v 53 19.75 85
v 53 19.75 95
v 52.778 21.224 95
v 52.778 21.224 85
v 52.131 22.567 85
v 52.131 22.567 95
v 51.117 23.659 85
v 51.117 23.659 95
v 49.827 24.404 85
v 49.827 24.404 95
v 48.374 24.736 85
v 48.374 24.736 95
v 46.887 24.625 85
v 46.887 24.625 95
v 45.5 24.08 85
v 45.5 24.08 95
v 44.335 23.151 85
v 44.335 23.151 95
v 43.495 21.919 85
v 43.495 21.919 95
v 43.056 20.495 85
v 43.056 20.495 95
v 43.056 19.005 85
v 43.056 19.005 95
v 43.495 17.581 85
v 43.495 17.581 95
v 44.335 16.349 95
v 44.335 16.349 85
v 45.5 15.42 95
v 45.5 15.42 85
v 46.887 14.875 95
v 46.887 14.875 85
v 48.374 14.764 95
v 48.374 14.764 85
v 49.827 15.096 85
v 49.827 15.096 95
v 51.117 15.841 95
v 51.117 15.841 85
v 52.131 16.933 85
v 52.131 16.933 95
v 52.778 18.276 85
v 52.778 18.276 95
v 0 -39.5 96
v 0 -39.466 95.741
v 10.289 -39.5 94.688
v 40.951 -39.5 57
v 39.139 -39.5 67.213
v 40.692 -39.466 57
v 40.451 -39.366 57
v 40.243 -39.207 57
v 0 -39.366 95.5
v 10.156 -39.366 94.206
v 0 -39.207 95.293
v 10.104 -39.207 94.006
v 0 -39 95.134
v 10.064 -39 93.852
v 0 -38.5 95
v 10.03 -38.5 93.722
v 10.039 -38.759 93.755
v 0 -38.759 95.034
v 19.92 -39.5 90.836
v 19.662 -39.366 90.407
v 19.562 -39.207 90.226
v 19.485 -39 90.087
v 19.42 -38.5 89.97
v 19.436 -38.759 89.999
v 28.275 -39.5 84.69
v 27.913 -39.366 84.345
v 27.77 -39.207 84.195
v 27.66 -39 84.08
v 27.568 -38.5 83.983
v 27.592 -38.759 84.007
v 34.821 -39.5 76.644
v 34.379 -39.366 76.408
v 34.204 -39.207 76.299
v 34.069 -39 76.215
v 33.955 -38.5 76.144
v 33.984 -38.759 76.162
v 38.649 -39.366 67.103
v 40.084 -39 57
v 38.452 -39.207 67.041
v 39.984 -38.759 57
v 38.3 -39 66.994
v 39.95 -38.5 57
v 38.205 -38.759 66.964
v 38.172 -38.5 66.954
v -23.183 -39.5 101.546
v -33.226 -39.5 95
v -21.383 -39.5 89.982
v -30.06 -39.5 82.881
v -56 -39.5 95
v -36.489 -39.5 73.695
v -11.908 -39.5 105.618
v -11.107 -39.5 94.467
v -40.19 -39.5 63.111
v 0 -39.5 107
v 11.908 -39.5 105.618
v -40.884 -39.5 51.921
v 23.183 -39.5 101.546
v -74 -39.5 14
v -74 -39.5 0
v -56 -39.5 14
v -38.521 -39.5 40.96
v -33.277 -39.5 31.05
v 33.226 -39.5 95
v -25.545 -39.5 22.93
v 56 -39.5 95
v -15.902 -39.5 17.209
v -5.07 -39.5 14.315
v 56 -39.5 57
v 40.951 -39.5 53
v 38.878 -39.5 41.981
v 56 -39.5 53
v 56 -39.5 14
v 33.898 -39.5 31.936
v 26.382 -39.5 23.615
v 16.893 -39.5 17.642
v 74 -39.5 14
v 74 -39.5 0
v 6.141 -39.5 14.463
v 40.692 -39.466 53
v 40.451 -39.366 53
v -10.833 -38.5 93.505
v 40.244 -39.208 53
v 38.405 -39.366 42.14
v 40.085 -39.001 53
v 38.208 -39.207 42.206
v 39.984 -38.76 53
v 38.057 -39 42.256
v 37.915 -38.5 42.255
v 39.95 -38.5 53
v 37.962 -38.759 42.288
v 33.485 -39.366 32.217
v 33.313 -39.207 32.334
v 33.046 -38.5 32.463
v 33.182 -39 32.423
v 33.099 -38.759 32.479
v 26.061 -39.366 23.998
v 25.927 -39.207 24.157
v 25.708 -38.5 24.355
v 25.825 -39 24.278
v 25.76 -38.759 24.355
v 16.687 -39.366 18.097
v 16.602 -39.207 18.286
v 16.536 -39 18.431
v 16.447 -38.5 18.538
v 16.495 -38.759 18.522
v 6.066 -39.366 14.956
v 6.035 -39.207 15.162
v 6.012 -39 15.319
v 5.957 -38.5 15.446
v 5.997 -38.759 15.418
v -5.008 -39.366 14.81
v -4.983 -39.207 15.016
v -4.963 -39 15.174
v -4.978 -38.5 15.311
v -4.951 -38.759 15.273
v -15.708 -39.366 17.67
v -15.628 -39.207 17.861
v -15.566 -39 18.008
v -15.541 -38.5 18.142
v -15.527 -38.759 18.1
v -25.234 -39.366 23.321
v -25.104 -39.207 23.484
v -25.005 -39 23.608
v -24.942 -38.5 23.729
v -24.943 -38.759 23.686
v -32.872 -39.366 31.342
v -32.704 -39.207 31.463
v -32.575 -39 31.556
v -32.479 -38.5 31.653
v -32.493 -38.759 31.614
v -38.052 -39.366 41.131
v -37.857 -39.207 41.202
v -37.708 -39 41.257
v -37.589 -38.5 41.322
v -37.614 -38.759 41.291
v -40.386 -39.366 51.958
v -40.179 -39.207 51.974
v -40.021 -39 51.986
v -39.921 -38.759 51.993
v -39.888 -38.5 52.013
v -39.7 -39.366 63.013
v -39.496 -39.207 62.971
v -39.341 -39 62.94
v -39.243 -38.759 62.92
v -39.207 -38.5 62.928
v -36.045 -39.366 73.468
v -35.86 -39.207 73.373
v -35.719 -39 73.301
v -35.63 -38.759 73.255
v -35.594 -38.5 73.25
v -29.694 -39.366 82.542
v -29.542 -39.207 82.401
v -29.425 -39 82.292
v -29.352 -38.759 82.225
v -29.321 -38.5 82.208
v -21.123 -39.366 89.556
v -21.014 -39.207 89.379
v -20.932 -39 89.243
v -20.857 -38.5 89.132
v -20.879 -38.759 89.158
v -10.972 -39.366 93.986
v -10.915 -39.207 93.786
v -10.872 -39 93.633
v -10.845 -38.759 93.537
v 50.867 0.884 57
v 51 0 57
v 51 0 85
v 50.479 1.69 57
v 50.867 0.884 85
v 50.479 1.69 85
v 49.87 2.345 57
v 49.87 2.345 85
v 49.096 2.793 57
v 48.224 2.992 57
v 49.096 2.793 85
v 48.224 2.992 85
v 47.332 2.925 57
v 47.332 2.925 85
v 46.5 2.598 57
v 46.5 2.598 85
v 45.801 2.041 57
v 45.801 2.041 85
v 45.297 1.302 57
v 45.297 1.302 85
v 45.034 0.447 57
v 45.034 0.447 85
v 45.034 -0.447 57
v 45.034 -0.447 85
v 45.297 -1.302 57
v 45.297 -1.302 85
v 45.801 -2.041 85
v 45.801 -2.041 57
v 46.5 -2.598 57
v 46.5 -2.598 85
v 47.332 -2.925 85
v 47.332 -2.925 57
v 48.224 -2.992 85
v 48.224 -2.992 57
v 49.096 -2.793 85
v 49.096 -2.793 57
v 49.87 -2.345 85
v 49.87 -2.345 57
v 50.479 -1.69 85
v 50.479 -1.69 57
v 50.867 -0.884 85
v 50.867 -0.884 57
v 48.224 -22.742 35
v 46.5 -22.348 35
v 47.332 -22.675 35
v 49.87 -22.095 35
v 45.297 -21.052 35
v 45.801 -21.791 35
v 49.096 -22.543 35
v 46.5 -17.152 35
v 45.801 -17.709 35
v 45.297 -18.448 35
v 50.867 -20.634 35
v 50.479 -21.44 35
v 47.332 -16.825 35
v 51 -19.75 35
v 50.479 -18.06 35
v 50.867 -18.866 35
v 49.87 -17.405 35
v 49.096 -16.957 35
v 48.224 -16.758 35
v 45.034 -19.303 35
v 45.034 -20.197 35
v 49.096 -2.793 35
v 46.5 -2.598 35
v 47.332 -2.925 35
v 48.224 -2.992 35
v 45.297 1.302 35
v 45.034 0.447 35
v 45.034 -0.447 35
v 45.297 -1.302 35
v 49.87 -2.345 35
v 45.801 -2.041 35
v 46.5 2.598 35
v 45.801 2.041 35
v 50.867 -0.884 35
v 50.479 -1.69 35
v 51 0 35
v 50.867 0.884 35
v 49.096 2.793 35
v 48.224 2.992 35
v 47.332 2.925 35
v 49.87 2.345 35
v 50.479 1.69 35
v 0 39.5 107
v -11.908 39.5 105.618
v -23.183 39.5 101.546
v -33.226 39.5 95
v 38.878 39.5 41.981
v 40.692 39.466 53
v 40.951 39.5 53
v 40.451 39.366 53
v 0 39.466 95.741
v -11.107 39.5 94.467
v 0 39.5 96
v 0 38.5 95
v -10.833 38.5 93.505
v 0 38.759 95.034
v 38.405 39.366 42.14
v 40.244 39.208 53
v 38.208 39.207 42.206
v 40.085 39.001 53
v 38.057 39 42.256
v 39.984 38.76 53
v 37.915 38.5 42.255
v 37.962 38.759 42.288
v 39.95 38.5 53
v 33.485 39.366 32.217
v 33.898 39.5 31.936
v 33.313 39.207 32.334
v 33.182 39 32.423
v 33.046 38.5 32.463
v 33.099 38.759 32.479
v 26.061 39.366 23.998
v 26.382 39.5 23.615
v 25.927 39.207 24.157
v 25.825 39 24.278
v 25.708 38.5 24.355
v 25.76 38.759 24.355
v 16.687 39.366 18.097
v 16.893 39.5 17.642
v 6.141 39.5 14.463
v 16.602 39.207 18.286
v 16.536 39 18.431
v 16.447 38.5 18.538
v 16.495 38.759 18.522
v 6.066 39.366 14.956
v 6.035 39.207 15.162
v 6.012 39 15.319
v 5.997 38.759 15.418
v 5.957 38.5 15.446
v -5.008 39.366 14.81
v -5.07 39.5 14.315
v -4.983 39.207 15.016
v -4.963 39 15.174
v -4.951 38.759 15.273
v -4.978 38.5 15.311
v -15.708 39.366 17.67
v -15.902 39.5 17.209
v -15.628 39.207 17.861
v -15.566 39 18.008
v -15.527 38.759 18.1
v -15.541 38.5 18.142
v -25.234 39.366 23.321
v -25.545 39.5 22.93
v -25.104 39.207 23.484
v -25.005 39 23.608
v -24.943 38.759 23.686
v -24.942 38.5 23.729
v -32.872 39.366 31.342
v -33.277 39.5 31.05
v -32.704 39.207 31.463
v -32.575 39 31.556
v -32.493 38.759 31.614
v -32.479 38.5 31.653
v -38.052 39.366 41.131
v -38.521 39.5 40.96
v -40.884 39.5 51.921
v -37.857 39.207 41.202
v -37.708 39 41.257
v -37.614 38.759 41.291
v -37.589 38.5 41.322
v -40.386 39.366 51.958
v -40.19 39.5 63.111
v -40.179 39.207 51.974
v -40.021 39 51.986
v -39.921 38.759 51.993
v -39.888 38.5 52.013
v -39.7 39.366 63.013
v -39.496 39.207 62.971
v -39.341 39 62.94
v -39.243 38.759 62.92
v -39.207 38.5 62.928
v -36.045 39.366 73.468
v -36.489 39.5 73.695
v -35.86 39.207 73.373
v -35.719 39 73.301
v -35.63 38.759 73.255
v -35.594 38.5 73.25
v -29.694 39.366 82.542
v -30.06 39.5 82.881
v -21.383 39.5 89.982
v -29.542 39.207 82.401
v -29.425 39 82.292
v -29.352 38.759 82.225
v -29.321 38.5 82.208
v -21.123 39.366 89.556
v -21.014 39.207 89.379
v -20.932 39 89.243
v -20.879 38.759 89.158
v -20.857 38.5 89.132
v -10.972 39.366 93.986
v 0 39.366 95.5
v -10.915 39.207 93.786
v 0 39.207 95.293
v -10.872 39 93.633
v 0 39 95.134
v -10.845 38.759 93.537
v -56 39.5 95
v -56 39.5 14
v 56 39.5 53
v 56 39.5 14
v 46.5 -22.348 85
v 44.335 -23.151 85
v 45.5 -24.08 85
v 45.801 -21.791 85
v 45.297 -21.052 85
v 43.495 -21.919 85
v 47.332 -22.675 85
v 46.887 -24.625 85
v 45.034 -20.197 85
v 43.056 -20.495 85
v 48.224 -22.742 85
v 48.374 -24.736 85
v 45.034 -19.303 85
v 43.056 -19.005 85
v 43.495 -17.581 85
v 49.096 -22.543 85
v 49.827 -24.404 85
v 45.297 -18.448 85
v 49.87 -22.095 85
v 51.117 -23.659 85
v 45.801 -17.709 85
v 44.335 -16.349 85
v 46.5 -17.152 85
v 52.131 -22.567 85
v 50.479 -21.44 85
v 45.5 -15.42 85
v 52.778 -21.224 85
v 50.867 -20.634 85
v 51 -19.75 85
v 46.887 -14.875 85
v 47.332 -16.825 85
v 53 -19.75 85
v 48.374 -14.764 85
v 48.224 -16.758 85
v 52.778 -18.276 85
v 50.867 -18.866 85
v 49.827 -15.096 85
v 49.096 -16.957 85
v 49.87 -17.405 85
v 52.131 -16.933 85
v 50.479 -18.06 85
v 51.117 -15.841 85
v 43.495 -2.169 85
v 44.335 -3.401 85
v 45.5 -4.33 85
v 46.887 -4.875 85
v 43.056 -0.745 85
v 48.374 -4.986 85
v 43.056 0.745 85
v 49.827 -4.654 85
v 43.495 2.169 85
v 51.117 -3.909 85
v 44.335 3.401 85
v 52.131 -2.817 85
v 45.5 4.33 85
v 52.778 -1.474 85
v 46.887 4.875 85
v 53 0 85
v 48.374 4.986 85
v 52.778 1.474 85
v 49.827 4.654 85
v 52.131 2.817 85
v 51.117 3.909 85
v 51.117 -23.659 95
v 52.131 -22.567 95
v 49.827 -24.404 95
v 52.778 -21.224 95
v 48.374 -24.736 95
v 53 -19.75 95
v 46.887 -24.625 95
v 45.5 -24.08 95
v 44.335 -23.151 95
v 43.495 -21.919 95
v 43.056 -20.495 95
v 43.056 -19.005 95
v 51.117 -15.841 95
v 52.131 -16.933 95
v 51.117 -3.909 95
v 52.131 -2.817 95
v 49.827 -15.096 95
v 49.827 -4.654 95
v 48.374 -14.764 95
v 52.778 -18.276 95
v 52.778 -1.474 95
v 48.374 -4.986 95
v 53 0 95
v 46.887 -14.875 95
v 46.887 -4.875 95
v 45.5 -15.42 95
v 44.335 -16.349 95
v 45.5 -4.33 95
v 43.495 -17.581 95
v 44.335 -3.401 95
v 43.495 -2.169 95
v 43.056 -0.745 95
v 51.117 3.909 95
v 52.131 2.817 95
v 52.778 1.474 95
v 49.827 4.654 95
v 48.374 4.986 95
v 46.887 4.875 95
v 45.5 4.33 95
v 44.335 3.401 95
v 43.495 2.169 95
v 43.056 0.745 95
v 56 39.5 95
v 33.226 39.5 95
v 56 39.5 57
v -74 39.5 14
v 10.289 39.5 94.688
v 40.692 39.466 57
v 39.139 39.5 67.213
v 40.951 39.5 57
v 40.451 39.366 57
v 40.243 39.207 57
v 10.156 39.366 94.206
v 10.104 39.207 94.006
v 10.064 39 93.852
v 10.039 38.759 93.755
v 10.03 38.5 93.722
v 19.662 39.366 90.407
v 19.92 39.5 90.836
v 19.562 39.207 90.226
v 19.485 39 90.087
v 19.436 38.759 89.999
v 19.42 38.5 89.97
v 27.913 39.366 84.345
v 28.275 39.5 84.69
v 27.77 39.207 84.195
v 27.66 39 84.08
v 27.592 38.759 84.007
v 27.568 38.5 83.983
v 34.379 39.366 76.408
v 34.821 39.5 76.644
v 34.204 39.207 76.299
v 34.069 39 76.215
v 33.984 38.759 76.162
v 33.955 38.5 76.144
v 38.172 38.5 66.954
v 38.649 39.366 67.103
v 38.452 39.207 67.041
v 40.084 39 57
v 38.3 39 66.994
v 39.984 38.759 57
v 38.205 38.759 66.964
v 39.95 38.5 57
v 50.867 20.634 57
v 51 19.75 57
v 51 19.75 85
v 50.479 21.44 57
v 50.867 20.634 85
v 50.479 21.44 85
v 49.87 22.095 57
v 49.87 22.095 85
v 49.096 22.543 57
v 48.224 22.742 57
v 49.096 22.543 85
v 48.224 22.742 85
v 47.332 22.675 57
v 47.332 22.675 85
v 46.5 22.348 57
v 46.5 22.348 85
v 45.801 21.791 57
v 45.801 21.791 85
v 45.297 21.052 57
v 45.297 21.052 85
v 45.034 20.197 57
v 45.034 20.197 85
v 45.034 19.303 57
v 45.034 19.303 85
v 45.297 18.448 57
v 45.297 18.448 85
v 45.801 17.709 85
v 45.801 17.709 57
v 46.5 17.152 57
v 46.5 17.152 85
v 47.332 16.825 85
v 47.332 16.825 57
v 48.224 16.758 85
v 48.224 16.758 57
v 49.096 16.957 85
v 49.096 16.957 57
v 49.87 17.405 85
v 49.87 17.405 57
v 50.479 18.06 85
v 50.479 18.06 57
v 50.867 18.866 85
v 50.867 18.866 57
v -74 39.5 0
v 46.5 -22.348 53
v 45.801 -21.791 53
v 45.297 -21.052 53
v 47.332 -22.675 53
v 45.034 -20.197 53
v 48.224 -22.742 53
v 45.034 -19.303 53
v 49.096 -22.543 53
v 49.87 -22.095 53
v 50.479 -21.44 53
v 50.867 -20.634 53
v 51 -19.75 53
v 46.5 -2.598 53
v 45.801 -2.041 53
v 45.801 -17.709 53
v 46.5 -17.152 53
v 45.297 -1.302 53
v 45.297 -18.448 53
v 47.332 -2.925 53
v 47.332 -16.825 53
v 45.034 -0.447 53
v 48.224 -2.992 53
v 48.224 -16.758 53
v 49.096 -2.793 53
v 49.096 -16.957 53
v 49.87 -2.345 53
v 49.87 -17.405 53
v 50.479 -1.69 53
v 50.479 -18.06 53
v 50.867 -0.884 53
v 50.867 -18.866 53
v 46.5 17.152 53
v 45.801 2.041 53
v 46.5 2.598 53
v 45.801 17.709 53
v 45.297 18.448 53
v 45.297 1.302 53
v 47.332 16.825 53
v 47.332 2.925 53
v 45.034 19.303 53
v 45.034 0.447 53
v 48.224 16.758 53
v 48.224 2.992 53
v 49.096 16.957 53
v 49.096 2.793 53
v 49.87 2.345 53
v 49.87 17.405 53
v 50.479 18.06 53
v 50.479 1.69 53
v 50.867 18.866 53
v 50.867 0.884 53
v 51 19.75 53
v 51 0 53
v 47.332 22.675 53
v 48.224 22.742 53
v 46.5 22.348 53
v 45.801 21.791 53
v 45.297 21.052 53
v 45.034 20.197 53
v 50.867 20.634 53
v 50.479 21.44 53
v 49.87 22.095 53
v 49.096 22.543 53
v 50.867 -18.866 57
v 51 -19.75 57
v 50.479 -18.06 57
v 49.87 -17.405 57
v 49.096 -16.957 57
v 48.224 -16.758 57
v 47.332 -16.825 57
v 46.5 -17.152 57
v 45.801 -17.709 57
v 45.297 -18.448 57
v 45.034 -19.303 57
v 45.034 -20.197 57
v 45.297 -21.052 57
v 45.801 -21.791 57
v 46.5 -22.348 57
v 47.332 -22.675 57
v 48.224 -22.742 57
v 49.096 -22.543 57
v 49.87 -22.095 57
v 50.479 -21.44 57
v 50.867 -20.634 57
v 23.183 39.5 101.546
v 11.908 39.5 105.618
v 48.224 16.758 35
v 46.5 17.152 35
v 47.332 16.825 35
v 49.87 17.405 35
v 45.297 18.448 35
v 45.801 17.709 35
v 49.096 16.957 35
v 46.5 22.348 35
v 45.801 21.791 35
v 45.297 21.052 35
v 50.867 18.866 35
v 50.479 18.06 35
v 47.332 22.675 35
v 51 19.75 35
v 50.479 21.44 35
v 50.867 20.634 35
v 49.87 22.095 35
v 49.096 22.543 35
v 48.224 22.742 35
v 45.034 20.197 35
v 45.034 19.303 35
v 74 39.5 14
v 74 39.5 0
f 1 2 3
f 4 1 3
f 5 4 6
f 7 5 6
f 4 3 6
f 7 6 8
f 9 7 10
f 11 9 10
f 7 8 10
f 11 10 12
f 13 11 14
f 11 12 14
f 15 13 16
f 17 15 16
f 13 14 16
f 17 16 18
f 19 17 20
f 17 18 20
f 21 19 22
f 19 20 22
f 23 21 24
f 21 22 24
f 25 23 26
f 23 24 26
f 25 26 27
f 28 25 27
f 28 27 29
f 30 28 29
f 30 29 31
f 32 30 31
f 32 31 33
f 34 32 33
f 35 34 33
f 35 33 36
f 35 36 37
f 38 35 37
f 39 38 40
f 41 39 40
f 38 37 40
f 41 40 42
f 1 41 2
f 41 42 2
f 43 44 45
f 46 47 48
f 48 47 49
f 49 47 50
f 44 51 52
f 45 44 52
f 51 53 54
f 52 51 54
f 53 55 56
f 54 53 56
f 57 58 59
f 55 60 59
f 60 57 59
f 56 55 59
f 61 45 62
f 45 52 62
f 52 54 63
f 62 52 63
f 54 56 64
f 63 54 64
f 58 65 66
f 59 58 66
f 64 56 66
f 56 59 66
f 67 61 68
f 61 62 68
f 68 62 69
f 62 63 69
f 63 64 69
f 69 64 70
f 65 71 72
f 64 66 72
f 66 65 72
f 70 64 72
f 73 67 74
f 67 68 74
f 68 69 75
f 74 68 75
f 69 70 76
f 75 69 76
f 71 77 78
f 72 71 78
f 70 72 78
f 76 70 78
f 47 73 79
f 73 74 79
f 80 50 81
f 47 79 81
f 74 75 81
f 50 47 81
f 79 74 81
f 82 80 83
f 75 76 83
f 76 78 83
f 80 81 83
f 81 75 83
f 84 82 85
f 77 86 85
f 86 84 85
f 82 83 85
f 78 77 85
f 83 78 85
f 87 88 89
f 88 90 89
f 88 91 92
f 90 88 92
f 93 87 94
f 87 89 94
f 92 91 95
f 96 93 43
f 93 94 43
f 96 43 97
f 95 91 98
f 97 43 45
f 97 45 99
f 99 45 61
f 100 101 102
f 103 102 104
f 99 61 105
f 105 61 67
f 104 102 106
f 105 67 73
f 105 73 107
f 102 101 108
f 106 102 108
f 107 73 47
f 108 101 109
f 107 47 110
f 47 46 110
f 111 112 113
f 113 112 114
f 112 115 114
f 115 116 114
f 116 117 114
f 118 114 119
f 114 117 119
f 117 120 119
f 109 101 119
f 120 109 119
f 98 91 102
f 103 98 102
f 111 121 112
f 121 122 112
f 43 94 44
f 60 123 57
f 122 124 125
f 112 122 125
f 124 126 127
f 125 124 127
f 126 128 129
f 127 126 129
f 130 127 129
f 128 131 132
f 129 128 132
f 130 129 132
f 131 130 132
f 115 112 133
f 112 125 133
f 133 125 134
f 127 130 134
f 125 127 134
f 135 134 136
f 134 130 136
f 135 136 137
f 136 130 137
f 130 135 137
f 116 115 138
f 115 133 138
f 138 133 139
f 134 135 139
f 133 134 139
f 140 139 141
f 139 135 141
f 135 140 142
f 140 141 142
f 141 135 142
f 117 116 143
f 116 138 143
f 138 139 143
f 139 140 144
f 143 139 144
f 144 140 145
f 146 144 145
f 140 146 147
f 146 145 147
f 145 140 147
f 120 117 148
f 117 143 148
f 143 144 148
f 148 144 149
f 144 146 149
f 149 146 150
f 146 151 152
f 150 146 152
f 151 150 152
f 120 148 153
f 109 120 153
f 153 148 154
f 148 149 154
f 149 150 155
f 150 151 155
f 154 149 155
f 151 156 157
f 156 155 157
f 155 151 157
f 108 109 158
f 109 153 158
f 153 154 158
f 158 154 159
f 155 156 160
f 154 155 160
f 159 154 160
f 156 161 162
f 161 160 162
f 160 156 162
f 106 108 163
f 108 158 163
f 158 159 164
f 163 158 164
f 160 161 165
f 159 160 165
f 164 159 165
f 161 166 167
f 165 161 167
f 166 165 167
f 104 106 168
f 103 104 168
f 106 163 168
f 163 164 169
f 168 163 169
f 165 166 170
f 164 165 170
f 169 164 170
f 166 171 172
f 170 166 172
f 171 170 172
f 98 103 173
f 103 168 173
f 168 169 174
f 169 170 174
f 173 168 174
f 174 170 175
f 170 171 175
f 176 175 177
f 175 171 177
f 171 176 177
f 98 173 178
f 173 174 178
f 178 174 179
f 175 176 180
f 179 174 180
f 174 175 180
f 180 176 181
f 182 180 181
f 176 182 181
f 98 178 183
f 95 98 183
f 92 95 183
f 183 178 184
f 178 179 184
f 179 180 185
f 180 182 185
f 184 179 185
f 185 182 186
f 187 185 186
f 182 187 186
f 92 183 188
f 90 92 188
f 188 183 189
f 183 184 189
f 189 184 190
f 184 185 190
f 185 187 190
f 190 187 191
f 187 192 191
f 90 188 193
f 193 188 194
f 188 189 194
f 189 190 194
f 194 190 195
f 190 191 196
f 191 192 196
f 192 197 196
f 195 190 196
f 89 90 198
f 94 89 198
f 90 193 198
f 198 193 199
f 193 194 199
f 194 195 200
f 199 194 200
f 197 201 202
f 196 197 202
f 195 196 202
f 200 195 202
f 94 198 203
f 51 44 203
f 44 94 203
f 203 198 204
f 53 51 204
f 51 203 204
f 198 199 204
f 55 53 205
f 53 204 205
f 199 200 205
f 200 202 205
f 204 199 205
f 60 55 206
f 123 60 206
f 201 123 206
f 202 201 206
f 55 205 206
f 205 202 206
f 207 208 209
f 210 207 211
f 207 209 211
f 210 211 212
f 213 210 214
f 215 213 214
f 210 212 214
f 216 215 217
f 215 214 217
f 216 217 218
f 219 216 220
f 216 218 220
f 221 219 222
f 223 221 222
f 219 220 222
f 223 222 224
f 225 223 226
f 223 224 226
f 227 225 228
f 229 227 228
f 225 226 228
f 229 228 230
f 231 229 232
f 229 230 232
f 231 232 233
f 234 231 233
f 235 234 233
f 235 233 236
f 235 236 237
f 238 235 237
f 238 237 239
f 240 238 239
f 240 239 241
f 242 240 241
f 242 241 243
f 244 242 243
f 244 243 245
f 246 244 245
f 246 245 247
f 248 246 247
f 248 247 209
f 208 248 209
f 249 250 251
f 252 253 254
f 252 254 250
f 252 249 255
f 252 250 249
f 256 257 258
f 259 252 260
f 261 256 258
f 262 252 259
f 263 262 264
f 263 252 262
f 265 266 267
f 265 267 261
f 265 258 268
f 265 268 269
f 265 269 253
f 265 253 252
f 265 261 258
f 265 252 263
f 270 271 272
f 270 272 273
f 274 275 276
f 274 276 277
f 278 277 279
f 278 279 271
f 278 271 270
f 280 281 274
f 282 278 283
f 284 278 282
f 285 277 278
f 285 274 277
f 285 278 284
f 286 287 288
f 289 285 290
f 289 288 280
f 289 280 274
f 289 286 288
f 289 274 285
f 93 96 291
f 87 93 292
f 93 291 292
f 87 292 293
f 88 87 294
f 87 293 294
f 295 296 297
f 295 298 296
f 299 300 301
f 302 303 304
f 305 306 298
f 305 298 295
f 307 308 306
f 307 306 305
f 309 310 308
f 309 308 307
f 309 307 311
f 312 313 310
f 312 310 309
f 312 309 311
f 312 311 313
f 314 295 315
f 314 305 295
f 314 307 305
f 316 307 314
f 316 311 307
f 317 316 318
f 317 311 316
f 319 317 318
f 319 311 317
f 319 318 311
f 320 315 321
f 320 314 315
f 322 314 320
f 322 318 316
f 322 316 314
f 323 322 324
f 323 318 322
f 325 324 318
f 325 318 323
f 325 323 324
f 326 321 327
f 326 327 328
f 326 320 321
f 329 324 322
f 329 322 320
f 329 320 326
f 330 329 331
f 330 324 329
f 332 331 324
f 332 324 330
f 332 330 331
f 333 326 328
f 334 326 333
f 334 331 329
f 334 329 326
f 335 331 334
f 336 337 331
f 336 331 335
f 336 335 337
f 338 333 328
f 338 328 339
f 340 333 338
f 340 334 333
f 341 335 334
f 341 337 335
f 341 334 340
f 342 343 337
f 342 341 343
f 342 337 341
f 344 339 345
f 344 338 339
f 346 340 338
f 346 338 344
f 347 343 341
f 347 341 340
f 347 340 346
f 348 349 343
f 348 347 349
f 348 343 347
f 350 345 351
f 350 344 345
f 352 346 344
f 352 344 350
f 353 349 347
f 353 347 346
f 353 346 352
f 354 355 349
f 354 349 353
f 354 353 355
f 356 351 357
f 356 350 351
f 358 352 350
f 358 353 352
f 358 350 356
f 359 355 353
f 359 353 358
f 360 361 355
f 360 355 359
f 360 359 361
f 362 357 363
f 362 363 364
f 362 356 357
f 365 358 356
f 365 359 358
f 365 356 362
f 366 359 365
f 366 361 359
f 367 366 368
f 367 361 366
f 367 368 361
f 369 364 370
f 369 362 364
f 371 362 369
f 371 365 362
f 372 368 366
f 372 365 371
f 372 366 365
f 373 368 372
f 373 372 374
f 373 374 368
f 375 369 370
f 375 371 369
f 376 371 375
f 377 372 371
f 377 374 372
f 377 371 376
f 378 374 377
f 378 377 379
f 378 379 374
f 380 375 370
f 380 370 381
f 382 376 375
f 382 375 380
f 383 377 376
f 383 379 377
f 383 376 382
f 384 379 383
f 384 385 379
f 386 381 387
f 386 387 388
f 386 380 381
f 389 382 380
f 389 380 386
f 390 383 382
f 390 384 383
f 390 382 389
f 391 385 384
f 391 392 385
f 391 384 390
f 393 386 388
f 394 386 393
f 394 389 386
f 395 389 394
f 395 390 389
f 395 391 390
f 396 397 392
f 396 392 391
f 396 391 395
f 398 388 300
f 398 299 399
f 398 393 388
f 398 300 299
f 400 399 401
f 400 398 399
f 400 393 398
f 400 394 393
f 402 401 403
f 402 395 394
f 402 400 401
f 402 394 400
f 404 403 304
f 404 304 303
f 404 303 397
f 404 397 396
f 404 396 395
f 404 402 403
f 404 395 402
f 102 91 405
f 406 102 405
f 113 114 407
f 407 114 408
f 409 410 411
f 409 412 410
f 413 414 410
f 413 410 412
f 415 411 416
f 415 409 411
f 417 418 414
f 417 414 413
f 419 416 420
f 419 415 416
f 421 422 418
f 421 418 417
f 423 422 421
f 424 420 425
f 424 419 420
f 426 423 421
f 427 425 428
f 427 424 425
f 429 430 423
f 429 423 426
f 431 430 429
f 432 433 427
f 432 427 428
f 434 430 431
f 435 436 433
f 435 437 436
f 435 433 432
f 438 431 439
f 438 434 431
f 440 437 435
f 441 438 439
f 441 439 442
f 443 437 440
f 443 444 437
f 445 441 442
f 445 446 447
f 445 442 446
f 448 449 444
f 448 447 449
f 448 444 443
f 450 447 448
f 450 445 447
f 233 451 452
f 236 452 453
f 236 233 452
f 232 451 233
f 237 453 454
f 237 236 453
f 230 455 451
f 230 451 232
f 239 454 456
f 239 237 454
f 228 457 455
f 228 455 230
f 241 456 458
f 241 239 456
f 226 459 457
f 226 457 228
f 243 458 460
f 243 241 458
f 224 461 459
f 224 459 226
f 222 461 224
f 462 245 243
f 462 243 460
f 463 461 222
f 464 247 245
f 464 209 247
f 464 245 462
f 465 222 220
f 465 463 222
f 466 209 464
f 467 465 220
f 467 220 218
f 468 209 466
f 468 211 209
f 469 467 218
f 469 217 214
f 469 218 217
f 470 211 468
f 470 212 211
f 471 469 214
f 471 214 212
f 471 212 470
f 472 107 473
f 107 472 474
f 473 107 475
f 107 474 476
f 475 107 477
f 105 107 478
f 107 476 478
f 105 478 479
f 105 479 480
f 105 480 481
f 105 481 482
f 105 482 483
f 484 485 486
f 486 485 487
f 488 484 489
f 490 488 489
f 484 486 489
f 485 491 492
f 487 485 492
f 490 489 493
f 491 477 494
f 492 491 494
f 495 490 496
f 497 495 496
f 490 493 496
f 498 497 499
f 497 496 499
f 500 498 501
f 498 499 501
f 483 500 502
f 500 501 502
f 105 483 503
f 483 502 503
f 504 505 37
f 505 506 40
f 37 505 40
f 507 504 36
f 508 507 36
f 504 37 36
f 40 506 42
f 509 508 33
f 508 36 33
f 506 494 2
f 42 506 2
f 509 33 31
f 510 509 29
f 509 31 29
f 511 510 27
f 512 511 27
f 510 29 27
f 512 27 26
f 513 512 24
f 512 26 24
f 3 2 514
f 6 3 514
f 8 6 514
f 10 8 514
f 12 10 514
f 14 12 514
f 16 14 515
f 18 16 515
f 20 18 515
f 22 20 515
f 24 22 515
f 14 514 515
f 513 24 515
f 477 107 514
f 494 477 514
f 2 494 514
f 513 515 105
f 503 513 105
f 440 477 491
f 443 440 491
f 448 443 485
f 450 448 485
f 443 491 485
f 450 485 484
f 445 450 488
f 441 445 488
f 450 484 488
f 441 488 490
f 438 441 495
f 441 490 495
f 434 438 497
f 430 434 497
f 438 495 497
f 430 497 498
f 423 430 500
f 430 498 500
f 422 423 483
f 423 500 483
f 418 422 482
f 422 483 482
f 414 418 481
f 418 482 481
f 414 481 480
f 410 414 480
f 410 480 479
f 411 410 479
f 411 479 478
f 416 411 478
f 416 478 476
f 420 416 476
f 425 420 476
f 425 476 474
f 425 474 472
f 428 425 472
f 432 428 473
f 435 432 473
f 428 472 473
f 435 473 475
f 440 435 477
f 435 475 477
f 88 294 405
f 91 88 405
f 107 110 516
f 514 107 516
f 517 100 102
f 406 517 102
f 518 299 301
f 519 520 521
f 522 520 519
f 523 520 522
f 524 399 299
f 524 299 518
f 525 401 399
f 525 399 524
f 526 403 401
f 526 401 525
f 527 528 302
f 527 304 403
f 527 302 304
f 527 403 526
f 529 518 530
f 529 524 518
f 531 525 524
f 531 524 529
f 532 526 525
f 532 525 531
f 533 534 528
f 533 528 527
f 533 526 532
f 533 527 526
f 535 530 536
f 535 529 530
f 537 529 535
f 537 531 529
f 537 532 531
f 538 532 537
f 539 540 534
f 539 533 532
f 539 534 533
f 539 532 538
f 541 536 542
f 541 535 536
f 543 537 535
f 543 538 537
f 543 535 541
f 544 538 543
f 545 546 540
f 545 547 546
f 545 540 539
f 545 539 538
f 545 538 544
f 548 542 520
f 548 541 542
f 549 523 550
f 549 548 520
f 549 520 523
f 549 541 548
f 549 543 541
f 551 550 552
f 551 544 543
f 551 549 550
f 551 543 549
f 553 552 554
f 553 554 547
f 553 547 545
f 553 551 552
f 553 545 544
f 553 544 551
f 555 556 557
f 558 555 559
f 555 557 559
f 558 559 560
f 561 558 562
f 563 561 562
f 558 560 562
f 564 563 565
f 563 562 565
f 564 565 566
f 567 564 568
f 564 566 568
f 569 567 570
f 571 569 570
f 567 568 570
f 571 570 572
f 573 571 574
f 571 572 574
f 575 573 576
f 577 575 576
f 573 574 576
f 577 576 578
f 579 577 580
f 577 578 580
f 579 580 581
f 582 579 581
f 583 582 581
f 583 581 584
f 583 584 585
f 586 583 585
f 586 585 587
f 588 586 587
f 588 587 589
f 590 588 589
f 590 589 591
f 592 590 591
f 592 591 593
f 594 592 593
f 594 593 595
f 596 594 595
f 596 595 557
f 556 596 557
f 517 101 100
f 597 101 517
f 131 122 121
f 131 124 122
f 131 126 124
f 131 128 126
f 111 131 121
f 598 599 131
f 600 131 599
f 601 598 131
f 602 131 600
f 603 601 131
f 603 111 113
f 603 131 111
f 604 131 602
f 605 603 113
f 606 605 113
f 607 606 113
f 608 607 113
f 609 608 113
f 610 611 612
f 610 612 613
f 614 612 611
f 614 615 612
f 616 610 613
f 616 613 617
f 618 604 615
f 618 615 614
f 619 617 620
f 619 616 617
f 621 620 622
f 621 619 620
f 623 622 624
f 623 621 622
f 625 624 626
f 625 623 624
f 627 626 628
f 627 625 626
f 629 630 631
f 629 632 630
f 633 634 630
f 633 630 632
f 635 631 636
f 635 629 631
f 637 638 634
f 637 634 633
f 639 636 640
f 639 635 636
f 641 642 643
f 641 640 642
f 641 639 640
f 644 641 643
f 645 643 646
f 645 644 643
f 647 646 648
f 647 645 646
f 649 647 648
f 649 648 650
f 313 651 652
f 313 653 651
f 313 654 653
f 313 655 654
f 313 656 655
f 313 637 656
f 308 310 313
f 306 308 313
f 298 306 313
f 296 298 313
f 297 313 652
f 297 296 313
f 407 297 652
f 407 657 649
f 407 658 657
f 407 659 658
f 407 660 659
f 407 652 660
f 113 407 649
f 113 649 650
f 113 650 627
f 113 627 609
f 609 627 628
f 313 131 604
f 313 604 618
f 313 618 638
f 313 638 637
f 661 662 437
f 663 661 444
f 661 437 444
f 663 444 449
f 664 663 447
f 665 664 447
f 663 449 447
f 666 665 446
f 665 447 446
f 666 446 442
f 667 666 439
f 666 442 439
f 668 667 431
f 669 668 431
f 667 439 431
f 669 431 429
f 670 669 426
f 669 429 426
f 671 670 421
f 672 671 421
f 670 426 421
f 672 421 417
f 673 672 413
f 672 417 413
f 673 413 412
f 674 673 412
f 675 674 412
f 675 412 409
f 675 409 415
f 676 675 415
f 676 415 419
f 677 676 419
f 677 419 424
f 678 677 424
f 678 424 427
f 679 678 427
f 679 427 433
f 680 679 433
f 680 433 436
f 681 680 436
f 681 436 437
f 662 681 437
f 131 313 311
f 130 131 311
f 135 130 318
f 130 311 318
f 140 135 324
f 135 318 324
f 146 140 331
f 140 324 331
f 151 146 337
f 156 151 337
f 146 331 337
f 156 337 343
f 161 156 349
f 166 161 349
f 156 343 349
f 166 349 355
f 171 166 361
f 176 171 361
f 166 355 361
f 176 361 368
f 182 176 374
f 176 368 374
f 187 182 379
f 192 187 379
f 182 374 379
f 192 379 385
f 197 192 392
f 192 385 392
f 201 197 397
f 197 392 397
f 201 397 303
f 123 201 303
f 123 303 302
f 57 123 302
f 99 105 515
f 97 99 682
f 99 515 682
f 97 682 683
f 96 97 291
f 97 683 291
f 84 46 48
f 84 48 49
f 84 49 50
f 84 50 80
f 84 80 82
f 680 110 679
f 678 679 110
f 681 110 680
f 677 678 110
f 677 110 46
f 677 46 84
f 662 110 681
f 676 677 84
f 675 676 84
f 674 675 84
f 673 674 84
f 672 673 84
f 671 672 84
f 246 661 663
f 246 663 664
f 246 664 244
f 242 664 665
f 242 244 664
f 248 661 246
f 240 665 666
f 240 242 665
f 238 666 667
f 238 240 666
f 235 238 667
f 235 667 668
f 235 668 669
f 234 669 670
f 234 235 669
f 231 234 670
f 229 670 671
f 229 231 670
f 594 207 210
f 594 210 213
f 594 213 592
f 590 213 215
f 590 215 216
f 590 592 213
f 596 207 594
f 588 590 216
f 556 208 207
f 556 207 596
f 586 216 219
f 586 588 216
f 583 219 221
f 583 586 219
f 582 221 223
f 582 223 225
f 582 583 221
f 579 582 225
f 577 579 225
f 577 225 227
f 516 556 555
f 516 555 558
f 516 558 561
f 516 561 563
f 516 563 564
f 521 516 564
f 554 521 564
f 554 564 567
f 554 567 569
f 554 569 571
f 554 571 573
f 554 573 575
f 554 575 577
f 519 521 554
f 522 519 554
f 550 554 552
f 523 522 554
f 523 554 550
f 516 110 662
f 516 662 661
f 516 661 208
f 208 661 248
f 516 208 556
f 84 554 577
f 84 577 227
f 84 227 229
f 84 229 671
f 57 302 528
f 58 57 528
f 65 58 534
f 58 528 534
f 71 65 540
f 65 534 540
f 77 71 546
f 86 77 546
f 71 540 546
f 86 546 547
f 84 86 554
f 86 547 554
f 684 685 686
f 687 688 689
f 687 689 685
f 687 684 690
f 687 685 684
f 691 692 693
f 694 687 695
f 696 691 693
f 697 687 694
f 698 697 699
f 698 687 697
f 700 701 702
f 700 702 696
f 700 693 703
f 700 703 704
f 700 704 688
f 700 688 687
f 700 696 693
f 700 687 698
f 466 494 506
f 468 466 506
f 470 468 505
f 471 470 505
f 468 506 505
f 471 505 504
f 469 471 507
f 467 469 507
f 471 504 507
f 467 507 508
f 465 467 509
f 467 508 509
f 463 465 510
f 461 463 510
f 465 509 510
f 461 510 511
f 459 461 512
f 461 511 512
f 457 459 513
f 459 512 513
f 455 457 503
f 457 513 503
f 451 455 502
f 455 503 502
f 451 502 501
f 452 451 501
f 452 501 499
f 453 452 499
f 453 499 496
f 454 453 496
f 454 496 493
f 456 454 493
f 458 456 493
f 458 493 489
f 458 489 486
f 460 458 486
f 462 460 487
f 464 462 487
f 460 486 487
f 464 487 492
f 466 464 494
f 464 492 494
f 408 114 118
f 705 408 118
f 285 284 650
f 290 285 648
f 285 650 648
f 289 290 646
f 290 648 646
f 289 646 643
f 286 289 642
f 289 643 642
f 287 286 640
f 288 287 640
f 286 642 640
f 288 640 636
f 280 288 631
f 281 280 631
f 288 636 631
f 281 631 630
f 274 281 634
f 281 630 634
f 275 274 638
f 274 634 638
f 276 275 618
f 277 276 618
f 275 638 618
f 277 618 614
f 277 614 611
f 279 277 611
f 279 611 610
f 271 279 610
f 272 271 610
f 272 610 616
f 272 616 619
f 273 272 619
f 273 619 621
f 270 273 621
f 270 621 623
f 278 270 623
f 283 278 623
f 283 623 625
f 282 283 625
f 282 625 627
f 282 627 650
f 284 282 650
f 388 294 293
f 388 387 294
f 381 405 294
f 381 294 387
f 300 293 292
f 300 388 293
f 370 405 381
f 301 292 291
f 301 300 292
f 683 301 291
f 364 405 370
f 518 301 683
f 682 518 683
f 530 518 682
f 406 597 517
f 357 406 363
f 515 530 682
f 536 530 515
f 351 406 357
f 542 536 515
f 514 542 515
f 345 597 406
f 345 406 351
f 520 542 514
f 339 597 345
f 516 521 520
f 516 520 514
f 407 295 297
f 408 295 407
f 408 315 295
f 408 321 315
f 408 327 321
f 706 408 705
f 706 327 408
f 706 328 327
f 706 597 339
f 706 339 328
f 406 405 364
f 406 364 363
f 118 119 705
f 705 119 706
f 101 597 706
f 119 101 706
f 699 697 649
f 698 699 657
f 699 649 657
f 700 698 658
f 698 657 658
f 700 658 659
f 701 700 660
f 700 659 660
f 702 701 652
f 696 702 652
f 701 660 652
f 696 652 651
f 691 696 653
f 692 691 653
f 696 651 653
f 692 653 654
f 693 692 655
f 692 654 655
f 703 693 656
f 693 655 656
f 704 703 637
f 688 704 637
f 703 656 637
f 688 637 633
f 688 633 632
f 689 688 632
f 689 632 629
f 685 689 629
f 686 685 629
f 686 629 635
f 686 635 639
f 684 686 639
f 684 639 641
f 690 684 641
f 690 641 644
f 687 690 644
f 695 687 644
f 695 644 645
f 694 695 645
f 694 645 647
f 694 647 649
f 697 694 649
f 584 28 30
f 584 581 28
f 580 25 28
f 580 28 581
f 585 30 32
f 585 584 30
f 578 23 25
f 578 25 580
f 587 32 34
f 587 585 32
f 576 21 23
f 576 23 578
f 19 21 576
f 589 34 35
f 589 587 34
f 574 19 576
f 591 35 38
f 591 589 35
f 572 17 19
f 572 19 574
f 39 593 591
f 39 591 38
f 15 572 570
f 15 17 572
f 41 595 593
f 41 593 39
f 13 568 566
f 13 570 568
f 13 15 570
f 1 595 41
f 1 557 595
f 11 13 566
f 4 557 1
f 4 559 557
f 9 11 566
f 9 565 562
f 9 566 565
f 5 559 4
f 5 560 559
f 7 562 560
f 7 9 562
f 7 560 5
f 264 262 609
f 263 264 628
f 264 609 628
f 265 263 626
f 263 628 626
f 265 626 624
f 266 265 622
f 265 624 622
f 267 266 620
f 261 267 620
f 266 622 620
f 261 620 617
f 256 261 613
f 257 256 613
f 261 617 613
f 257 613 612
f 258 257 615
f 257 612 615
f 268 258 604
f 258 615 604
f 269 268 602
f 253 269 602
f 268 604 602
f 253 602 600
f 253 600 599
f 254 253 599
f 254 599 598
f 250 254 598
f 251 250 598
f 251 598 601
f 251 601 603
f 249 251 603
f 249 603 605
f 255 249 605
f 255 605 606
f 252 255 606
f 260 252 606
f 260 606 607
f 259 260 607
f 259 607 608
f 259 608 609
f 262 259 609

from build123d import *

# Parameters (mm, degrees)
SKETCH1_W           = 148
SKETCH1_H           = 79
BOSS_EXTRUDE1_DEPTH = 14
SKETCH2_W           = 112
SKETCH2_H           = 79
BOSS_EXTRUDE2_DEPTH = 93
SKETCH3_R           = 40
CUT_EXTRUDE1_DEPTH  = 80
CUT_EXTRUDE2_DEPTH  = 80
CUT_EXTRUDE4_DEPTH  = 80
SKETCH9_R           = 3
CUT_EXTRUDE5_DEPTH  = 60
SKETCH10_R          = 5
CUT_EXTRUDE6_DEPTH  = 10
FILLET1_R           = 1


with BuildPart() as part:
    # Sketch1 → Boss-Extrude1 (new body)
    with BuildSketch(Plane.XY):
        Rectangle(SKETCH1_W, SKETCH1_H)
    extrude(amount=BOSS_EXTRUDE1_DEPTH)

    # Sketch2 → Boss-Extrude2 (add)
    with BuildSketch(Plane.XY.offset(14)):
        Rectangle(SKETCH2_W, SKETCH2_H)
    extrude(amount=BOSS_EXTRUDE2_DEPTH)

    # Sketch3 → Cut-Extrude1 (cut)
    with BuildSketch(Plane(origin=(0, 39.5, 0), x_dir=(1, 0, 0), z_dir=(0, 1, 0))):
        with Locations(Location((0, -55, 0), (0, 0, 270))):
            Circle(SKETCH3_R)
    extrude(amount=-CUT_EXTRUDE1_DEPTH, mode=Mode.SUBTRACT)

    # Sketch6 → Cut-Extrude2 (cut)
    with BuildSketch(Plane(origin=(0, 39.5, 0), x_dir=(1, 0, 0), z_dir=(0, 1, 0))):
        with BuildLine():
            ThreePointArc((0, -107), (-17.663521733, -103.908077043), (-33.226495452, -95))
            Line((-33.226495452, -95), (-56, -95))
            Line((-56, -95), (-56, -107))
            Line((-56, -107), (0, -107))
        make_face()
        with BuildLine():
            ThreePointArc((33.226495452, -95), (17.663521733, -103.908077043), (0, -107))
            Line((0, -107), (56, -107))
            Line((56, -107), (56, -95))
            Line((56, -95), (33.226495452, -95))
        make_face()
    extrude(amount=-CUT_EXTRUDE2_DEPTH, mode=Mode.SUBTRACT)

    # Sketch8 → Cut-Extrude4 (cut)
    with BuildSketch(Plane(origin=(0, 39.5, 0), x_dir=(1, 0, 0), z_dir=(0, 1, 0))):
        Polygon((56, -55), (56, -57), (38.221026174, -57), (38.221026174, -53), (56, -53), align=None)
    extrude(amount=-CUT_EXTRUDE4_DEPTH, mode=Mode.SUBTRACT)

    # Sketch9 → Cut-Extrude5 (cut)
    with BuildSketch(Plane.XY.offset(95)):
        with Locations((48, 19.75)):
            Circle(SKETCH9_R)
        with Locations((48, 0)):
            Circle(SKETCH9_R)
        with Locations((48, -19.75)):
            Circle(SKETCH9_R)
    extrude(amount=-CUT_EXTRUDE5_DEPTH, mode=Mode.SUBTRACT)

    # Sketch10 → Cut-Extrude6 (cut)
    with BuildSketch(Plane.XY.offset(95)):
        with Locations((48, 19.75)):
            Circle(SKETCH10_R)
        with Locations((48, 0)):
            Circle(SKETCH10_R)
        with Locations((48, -19.75)):
            Circle(SKETCH10_R)
    extrude(amount=-CUT_EXTRUDE6_DEPTH, mode=Mode.SUBTRACT)

    # Fillet1
    fillet1_edges = [part.edges().sort_by_distance(p)[0] for p in [
        (-28.982753492, 39.5, 27.431902496),
        (-28.982753492, -39.5, 27.431902496),
    ]]
    fillet(fillet1_edges, radius=FILLET1_R)


solid = part.part
